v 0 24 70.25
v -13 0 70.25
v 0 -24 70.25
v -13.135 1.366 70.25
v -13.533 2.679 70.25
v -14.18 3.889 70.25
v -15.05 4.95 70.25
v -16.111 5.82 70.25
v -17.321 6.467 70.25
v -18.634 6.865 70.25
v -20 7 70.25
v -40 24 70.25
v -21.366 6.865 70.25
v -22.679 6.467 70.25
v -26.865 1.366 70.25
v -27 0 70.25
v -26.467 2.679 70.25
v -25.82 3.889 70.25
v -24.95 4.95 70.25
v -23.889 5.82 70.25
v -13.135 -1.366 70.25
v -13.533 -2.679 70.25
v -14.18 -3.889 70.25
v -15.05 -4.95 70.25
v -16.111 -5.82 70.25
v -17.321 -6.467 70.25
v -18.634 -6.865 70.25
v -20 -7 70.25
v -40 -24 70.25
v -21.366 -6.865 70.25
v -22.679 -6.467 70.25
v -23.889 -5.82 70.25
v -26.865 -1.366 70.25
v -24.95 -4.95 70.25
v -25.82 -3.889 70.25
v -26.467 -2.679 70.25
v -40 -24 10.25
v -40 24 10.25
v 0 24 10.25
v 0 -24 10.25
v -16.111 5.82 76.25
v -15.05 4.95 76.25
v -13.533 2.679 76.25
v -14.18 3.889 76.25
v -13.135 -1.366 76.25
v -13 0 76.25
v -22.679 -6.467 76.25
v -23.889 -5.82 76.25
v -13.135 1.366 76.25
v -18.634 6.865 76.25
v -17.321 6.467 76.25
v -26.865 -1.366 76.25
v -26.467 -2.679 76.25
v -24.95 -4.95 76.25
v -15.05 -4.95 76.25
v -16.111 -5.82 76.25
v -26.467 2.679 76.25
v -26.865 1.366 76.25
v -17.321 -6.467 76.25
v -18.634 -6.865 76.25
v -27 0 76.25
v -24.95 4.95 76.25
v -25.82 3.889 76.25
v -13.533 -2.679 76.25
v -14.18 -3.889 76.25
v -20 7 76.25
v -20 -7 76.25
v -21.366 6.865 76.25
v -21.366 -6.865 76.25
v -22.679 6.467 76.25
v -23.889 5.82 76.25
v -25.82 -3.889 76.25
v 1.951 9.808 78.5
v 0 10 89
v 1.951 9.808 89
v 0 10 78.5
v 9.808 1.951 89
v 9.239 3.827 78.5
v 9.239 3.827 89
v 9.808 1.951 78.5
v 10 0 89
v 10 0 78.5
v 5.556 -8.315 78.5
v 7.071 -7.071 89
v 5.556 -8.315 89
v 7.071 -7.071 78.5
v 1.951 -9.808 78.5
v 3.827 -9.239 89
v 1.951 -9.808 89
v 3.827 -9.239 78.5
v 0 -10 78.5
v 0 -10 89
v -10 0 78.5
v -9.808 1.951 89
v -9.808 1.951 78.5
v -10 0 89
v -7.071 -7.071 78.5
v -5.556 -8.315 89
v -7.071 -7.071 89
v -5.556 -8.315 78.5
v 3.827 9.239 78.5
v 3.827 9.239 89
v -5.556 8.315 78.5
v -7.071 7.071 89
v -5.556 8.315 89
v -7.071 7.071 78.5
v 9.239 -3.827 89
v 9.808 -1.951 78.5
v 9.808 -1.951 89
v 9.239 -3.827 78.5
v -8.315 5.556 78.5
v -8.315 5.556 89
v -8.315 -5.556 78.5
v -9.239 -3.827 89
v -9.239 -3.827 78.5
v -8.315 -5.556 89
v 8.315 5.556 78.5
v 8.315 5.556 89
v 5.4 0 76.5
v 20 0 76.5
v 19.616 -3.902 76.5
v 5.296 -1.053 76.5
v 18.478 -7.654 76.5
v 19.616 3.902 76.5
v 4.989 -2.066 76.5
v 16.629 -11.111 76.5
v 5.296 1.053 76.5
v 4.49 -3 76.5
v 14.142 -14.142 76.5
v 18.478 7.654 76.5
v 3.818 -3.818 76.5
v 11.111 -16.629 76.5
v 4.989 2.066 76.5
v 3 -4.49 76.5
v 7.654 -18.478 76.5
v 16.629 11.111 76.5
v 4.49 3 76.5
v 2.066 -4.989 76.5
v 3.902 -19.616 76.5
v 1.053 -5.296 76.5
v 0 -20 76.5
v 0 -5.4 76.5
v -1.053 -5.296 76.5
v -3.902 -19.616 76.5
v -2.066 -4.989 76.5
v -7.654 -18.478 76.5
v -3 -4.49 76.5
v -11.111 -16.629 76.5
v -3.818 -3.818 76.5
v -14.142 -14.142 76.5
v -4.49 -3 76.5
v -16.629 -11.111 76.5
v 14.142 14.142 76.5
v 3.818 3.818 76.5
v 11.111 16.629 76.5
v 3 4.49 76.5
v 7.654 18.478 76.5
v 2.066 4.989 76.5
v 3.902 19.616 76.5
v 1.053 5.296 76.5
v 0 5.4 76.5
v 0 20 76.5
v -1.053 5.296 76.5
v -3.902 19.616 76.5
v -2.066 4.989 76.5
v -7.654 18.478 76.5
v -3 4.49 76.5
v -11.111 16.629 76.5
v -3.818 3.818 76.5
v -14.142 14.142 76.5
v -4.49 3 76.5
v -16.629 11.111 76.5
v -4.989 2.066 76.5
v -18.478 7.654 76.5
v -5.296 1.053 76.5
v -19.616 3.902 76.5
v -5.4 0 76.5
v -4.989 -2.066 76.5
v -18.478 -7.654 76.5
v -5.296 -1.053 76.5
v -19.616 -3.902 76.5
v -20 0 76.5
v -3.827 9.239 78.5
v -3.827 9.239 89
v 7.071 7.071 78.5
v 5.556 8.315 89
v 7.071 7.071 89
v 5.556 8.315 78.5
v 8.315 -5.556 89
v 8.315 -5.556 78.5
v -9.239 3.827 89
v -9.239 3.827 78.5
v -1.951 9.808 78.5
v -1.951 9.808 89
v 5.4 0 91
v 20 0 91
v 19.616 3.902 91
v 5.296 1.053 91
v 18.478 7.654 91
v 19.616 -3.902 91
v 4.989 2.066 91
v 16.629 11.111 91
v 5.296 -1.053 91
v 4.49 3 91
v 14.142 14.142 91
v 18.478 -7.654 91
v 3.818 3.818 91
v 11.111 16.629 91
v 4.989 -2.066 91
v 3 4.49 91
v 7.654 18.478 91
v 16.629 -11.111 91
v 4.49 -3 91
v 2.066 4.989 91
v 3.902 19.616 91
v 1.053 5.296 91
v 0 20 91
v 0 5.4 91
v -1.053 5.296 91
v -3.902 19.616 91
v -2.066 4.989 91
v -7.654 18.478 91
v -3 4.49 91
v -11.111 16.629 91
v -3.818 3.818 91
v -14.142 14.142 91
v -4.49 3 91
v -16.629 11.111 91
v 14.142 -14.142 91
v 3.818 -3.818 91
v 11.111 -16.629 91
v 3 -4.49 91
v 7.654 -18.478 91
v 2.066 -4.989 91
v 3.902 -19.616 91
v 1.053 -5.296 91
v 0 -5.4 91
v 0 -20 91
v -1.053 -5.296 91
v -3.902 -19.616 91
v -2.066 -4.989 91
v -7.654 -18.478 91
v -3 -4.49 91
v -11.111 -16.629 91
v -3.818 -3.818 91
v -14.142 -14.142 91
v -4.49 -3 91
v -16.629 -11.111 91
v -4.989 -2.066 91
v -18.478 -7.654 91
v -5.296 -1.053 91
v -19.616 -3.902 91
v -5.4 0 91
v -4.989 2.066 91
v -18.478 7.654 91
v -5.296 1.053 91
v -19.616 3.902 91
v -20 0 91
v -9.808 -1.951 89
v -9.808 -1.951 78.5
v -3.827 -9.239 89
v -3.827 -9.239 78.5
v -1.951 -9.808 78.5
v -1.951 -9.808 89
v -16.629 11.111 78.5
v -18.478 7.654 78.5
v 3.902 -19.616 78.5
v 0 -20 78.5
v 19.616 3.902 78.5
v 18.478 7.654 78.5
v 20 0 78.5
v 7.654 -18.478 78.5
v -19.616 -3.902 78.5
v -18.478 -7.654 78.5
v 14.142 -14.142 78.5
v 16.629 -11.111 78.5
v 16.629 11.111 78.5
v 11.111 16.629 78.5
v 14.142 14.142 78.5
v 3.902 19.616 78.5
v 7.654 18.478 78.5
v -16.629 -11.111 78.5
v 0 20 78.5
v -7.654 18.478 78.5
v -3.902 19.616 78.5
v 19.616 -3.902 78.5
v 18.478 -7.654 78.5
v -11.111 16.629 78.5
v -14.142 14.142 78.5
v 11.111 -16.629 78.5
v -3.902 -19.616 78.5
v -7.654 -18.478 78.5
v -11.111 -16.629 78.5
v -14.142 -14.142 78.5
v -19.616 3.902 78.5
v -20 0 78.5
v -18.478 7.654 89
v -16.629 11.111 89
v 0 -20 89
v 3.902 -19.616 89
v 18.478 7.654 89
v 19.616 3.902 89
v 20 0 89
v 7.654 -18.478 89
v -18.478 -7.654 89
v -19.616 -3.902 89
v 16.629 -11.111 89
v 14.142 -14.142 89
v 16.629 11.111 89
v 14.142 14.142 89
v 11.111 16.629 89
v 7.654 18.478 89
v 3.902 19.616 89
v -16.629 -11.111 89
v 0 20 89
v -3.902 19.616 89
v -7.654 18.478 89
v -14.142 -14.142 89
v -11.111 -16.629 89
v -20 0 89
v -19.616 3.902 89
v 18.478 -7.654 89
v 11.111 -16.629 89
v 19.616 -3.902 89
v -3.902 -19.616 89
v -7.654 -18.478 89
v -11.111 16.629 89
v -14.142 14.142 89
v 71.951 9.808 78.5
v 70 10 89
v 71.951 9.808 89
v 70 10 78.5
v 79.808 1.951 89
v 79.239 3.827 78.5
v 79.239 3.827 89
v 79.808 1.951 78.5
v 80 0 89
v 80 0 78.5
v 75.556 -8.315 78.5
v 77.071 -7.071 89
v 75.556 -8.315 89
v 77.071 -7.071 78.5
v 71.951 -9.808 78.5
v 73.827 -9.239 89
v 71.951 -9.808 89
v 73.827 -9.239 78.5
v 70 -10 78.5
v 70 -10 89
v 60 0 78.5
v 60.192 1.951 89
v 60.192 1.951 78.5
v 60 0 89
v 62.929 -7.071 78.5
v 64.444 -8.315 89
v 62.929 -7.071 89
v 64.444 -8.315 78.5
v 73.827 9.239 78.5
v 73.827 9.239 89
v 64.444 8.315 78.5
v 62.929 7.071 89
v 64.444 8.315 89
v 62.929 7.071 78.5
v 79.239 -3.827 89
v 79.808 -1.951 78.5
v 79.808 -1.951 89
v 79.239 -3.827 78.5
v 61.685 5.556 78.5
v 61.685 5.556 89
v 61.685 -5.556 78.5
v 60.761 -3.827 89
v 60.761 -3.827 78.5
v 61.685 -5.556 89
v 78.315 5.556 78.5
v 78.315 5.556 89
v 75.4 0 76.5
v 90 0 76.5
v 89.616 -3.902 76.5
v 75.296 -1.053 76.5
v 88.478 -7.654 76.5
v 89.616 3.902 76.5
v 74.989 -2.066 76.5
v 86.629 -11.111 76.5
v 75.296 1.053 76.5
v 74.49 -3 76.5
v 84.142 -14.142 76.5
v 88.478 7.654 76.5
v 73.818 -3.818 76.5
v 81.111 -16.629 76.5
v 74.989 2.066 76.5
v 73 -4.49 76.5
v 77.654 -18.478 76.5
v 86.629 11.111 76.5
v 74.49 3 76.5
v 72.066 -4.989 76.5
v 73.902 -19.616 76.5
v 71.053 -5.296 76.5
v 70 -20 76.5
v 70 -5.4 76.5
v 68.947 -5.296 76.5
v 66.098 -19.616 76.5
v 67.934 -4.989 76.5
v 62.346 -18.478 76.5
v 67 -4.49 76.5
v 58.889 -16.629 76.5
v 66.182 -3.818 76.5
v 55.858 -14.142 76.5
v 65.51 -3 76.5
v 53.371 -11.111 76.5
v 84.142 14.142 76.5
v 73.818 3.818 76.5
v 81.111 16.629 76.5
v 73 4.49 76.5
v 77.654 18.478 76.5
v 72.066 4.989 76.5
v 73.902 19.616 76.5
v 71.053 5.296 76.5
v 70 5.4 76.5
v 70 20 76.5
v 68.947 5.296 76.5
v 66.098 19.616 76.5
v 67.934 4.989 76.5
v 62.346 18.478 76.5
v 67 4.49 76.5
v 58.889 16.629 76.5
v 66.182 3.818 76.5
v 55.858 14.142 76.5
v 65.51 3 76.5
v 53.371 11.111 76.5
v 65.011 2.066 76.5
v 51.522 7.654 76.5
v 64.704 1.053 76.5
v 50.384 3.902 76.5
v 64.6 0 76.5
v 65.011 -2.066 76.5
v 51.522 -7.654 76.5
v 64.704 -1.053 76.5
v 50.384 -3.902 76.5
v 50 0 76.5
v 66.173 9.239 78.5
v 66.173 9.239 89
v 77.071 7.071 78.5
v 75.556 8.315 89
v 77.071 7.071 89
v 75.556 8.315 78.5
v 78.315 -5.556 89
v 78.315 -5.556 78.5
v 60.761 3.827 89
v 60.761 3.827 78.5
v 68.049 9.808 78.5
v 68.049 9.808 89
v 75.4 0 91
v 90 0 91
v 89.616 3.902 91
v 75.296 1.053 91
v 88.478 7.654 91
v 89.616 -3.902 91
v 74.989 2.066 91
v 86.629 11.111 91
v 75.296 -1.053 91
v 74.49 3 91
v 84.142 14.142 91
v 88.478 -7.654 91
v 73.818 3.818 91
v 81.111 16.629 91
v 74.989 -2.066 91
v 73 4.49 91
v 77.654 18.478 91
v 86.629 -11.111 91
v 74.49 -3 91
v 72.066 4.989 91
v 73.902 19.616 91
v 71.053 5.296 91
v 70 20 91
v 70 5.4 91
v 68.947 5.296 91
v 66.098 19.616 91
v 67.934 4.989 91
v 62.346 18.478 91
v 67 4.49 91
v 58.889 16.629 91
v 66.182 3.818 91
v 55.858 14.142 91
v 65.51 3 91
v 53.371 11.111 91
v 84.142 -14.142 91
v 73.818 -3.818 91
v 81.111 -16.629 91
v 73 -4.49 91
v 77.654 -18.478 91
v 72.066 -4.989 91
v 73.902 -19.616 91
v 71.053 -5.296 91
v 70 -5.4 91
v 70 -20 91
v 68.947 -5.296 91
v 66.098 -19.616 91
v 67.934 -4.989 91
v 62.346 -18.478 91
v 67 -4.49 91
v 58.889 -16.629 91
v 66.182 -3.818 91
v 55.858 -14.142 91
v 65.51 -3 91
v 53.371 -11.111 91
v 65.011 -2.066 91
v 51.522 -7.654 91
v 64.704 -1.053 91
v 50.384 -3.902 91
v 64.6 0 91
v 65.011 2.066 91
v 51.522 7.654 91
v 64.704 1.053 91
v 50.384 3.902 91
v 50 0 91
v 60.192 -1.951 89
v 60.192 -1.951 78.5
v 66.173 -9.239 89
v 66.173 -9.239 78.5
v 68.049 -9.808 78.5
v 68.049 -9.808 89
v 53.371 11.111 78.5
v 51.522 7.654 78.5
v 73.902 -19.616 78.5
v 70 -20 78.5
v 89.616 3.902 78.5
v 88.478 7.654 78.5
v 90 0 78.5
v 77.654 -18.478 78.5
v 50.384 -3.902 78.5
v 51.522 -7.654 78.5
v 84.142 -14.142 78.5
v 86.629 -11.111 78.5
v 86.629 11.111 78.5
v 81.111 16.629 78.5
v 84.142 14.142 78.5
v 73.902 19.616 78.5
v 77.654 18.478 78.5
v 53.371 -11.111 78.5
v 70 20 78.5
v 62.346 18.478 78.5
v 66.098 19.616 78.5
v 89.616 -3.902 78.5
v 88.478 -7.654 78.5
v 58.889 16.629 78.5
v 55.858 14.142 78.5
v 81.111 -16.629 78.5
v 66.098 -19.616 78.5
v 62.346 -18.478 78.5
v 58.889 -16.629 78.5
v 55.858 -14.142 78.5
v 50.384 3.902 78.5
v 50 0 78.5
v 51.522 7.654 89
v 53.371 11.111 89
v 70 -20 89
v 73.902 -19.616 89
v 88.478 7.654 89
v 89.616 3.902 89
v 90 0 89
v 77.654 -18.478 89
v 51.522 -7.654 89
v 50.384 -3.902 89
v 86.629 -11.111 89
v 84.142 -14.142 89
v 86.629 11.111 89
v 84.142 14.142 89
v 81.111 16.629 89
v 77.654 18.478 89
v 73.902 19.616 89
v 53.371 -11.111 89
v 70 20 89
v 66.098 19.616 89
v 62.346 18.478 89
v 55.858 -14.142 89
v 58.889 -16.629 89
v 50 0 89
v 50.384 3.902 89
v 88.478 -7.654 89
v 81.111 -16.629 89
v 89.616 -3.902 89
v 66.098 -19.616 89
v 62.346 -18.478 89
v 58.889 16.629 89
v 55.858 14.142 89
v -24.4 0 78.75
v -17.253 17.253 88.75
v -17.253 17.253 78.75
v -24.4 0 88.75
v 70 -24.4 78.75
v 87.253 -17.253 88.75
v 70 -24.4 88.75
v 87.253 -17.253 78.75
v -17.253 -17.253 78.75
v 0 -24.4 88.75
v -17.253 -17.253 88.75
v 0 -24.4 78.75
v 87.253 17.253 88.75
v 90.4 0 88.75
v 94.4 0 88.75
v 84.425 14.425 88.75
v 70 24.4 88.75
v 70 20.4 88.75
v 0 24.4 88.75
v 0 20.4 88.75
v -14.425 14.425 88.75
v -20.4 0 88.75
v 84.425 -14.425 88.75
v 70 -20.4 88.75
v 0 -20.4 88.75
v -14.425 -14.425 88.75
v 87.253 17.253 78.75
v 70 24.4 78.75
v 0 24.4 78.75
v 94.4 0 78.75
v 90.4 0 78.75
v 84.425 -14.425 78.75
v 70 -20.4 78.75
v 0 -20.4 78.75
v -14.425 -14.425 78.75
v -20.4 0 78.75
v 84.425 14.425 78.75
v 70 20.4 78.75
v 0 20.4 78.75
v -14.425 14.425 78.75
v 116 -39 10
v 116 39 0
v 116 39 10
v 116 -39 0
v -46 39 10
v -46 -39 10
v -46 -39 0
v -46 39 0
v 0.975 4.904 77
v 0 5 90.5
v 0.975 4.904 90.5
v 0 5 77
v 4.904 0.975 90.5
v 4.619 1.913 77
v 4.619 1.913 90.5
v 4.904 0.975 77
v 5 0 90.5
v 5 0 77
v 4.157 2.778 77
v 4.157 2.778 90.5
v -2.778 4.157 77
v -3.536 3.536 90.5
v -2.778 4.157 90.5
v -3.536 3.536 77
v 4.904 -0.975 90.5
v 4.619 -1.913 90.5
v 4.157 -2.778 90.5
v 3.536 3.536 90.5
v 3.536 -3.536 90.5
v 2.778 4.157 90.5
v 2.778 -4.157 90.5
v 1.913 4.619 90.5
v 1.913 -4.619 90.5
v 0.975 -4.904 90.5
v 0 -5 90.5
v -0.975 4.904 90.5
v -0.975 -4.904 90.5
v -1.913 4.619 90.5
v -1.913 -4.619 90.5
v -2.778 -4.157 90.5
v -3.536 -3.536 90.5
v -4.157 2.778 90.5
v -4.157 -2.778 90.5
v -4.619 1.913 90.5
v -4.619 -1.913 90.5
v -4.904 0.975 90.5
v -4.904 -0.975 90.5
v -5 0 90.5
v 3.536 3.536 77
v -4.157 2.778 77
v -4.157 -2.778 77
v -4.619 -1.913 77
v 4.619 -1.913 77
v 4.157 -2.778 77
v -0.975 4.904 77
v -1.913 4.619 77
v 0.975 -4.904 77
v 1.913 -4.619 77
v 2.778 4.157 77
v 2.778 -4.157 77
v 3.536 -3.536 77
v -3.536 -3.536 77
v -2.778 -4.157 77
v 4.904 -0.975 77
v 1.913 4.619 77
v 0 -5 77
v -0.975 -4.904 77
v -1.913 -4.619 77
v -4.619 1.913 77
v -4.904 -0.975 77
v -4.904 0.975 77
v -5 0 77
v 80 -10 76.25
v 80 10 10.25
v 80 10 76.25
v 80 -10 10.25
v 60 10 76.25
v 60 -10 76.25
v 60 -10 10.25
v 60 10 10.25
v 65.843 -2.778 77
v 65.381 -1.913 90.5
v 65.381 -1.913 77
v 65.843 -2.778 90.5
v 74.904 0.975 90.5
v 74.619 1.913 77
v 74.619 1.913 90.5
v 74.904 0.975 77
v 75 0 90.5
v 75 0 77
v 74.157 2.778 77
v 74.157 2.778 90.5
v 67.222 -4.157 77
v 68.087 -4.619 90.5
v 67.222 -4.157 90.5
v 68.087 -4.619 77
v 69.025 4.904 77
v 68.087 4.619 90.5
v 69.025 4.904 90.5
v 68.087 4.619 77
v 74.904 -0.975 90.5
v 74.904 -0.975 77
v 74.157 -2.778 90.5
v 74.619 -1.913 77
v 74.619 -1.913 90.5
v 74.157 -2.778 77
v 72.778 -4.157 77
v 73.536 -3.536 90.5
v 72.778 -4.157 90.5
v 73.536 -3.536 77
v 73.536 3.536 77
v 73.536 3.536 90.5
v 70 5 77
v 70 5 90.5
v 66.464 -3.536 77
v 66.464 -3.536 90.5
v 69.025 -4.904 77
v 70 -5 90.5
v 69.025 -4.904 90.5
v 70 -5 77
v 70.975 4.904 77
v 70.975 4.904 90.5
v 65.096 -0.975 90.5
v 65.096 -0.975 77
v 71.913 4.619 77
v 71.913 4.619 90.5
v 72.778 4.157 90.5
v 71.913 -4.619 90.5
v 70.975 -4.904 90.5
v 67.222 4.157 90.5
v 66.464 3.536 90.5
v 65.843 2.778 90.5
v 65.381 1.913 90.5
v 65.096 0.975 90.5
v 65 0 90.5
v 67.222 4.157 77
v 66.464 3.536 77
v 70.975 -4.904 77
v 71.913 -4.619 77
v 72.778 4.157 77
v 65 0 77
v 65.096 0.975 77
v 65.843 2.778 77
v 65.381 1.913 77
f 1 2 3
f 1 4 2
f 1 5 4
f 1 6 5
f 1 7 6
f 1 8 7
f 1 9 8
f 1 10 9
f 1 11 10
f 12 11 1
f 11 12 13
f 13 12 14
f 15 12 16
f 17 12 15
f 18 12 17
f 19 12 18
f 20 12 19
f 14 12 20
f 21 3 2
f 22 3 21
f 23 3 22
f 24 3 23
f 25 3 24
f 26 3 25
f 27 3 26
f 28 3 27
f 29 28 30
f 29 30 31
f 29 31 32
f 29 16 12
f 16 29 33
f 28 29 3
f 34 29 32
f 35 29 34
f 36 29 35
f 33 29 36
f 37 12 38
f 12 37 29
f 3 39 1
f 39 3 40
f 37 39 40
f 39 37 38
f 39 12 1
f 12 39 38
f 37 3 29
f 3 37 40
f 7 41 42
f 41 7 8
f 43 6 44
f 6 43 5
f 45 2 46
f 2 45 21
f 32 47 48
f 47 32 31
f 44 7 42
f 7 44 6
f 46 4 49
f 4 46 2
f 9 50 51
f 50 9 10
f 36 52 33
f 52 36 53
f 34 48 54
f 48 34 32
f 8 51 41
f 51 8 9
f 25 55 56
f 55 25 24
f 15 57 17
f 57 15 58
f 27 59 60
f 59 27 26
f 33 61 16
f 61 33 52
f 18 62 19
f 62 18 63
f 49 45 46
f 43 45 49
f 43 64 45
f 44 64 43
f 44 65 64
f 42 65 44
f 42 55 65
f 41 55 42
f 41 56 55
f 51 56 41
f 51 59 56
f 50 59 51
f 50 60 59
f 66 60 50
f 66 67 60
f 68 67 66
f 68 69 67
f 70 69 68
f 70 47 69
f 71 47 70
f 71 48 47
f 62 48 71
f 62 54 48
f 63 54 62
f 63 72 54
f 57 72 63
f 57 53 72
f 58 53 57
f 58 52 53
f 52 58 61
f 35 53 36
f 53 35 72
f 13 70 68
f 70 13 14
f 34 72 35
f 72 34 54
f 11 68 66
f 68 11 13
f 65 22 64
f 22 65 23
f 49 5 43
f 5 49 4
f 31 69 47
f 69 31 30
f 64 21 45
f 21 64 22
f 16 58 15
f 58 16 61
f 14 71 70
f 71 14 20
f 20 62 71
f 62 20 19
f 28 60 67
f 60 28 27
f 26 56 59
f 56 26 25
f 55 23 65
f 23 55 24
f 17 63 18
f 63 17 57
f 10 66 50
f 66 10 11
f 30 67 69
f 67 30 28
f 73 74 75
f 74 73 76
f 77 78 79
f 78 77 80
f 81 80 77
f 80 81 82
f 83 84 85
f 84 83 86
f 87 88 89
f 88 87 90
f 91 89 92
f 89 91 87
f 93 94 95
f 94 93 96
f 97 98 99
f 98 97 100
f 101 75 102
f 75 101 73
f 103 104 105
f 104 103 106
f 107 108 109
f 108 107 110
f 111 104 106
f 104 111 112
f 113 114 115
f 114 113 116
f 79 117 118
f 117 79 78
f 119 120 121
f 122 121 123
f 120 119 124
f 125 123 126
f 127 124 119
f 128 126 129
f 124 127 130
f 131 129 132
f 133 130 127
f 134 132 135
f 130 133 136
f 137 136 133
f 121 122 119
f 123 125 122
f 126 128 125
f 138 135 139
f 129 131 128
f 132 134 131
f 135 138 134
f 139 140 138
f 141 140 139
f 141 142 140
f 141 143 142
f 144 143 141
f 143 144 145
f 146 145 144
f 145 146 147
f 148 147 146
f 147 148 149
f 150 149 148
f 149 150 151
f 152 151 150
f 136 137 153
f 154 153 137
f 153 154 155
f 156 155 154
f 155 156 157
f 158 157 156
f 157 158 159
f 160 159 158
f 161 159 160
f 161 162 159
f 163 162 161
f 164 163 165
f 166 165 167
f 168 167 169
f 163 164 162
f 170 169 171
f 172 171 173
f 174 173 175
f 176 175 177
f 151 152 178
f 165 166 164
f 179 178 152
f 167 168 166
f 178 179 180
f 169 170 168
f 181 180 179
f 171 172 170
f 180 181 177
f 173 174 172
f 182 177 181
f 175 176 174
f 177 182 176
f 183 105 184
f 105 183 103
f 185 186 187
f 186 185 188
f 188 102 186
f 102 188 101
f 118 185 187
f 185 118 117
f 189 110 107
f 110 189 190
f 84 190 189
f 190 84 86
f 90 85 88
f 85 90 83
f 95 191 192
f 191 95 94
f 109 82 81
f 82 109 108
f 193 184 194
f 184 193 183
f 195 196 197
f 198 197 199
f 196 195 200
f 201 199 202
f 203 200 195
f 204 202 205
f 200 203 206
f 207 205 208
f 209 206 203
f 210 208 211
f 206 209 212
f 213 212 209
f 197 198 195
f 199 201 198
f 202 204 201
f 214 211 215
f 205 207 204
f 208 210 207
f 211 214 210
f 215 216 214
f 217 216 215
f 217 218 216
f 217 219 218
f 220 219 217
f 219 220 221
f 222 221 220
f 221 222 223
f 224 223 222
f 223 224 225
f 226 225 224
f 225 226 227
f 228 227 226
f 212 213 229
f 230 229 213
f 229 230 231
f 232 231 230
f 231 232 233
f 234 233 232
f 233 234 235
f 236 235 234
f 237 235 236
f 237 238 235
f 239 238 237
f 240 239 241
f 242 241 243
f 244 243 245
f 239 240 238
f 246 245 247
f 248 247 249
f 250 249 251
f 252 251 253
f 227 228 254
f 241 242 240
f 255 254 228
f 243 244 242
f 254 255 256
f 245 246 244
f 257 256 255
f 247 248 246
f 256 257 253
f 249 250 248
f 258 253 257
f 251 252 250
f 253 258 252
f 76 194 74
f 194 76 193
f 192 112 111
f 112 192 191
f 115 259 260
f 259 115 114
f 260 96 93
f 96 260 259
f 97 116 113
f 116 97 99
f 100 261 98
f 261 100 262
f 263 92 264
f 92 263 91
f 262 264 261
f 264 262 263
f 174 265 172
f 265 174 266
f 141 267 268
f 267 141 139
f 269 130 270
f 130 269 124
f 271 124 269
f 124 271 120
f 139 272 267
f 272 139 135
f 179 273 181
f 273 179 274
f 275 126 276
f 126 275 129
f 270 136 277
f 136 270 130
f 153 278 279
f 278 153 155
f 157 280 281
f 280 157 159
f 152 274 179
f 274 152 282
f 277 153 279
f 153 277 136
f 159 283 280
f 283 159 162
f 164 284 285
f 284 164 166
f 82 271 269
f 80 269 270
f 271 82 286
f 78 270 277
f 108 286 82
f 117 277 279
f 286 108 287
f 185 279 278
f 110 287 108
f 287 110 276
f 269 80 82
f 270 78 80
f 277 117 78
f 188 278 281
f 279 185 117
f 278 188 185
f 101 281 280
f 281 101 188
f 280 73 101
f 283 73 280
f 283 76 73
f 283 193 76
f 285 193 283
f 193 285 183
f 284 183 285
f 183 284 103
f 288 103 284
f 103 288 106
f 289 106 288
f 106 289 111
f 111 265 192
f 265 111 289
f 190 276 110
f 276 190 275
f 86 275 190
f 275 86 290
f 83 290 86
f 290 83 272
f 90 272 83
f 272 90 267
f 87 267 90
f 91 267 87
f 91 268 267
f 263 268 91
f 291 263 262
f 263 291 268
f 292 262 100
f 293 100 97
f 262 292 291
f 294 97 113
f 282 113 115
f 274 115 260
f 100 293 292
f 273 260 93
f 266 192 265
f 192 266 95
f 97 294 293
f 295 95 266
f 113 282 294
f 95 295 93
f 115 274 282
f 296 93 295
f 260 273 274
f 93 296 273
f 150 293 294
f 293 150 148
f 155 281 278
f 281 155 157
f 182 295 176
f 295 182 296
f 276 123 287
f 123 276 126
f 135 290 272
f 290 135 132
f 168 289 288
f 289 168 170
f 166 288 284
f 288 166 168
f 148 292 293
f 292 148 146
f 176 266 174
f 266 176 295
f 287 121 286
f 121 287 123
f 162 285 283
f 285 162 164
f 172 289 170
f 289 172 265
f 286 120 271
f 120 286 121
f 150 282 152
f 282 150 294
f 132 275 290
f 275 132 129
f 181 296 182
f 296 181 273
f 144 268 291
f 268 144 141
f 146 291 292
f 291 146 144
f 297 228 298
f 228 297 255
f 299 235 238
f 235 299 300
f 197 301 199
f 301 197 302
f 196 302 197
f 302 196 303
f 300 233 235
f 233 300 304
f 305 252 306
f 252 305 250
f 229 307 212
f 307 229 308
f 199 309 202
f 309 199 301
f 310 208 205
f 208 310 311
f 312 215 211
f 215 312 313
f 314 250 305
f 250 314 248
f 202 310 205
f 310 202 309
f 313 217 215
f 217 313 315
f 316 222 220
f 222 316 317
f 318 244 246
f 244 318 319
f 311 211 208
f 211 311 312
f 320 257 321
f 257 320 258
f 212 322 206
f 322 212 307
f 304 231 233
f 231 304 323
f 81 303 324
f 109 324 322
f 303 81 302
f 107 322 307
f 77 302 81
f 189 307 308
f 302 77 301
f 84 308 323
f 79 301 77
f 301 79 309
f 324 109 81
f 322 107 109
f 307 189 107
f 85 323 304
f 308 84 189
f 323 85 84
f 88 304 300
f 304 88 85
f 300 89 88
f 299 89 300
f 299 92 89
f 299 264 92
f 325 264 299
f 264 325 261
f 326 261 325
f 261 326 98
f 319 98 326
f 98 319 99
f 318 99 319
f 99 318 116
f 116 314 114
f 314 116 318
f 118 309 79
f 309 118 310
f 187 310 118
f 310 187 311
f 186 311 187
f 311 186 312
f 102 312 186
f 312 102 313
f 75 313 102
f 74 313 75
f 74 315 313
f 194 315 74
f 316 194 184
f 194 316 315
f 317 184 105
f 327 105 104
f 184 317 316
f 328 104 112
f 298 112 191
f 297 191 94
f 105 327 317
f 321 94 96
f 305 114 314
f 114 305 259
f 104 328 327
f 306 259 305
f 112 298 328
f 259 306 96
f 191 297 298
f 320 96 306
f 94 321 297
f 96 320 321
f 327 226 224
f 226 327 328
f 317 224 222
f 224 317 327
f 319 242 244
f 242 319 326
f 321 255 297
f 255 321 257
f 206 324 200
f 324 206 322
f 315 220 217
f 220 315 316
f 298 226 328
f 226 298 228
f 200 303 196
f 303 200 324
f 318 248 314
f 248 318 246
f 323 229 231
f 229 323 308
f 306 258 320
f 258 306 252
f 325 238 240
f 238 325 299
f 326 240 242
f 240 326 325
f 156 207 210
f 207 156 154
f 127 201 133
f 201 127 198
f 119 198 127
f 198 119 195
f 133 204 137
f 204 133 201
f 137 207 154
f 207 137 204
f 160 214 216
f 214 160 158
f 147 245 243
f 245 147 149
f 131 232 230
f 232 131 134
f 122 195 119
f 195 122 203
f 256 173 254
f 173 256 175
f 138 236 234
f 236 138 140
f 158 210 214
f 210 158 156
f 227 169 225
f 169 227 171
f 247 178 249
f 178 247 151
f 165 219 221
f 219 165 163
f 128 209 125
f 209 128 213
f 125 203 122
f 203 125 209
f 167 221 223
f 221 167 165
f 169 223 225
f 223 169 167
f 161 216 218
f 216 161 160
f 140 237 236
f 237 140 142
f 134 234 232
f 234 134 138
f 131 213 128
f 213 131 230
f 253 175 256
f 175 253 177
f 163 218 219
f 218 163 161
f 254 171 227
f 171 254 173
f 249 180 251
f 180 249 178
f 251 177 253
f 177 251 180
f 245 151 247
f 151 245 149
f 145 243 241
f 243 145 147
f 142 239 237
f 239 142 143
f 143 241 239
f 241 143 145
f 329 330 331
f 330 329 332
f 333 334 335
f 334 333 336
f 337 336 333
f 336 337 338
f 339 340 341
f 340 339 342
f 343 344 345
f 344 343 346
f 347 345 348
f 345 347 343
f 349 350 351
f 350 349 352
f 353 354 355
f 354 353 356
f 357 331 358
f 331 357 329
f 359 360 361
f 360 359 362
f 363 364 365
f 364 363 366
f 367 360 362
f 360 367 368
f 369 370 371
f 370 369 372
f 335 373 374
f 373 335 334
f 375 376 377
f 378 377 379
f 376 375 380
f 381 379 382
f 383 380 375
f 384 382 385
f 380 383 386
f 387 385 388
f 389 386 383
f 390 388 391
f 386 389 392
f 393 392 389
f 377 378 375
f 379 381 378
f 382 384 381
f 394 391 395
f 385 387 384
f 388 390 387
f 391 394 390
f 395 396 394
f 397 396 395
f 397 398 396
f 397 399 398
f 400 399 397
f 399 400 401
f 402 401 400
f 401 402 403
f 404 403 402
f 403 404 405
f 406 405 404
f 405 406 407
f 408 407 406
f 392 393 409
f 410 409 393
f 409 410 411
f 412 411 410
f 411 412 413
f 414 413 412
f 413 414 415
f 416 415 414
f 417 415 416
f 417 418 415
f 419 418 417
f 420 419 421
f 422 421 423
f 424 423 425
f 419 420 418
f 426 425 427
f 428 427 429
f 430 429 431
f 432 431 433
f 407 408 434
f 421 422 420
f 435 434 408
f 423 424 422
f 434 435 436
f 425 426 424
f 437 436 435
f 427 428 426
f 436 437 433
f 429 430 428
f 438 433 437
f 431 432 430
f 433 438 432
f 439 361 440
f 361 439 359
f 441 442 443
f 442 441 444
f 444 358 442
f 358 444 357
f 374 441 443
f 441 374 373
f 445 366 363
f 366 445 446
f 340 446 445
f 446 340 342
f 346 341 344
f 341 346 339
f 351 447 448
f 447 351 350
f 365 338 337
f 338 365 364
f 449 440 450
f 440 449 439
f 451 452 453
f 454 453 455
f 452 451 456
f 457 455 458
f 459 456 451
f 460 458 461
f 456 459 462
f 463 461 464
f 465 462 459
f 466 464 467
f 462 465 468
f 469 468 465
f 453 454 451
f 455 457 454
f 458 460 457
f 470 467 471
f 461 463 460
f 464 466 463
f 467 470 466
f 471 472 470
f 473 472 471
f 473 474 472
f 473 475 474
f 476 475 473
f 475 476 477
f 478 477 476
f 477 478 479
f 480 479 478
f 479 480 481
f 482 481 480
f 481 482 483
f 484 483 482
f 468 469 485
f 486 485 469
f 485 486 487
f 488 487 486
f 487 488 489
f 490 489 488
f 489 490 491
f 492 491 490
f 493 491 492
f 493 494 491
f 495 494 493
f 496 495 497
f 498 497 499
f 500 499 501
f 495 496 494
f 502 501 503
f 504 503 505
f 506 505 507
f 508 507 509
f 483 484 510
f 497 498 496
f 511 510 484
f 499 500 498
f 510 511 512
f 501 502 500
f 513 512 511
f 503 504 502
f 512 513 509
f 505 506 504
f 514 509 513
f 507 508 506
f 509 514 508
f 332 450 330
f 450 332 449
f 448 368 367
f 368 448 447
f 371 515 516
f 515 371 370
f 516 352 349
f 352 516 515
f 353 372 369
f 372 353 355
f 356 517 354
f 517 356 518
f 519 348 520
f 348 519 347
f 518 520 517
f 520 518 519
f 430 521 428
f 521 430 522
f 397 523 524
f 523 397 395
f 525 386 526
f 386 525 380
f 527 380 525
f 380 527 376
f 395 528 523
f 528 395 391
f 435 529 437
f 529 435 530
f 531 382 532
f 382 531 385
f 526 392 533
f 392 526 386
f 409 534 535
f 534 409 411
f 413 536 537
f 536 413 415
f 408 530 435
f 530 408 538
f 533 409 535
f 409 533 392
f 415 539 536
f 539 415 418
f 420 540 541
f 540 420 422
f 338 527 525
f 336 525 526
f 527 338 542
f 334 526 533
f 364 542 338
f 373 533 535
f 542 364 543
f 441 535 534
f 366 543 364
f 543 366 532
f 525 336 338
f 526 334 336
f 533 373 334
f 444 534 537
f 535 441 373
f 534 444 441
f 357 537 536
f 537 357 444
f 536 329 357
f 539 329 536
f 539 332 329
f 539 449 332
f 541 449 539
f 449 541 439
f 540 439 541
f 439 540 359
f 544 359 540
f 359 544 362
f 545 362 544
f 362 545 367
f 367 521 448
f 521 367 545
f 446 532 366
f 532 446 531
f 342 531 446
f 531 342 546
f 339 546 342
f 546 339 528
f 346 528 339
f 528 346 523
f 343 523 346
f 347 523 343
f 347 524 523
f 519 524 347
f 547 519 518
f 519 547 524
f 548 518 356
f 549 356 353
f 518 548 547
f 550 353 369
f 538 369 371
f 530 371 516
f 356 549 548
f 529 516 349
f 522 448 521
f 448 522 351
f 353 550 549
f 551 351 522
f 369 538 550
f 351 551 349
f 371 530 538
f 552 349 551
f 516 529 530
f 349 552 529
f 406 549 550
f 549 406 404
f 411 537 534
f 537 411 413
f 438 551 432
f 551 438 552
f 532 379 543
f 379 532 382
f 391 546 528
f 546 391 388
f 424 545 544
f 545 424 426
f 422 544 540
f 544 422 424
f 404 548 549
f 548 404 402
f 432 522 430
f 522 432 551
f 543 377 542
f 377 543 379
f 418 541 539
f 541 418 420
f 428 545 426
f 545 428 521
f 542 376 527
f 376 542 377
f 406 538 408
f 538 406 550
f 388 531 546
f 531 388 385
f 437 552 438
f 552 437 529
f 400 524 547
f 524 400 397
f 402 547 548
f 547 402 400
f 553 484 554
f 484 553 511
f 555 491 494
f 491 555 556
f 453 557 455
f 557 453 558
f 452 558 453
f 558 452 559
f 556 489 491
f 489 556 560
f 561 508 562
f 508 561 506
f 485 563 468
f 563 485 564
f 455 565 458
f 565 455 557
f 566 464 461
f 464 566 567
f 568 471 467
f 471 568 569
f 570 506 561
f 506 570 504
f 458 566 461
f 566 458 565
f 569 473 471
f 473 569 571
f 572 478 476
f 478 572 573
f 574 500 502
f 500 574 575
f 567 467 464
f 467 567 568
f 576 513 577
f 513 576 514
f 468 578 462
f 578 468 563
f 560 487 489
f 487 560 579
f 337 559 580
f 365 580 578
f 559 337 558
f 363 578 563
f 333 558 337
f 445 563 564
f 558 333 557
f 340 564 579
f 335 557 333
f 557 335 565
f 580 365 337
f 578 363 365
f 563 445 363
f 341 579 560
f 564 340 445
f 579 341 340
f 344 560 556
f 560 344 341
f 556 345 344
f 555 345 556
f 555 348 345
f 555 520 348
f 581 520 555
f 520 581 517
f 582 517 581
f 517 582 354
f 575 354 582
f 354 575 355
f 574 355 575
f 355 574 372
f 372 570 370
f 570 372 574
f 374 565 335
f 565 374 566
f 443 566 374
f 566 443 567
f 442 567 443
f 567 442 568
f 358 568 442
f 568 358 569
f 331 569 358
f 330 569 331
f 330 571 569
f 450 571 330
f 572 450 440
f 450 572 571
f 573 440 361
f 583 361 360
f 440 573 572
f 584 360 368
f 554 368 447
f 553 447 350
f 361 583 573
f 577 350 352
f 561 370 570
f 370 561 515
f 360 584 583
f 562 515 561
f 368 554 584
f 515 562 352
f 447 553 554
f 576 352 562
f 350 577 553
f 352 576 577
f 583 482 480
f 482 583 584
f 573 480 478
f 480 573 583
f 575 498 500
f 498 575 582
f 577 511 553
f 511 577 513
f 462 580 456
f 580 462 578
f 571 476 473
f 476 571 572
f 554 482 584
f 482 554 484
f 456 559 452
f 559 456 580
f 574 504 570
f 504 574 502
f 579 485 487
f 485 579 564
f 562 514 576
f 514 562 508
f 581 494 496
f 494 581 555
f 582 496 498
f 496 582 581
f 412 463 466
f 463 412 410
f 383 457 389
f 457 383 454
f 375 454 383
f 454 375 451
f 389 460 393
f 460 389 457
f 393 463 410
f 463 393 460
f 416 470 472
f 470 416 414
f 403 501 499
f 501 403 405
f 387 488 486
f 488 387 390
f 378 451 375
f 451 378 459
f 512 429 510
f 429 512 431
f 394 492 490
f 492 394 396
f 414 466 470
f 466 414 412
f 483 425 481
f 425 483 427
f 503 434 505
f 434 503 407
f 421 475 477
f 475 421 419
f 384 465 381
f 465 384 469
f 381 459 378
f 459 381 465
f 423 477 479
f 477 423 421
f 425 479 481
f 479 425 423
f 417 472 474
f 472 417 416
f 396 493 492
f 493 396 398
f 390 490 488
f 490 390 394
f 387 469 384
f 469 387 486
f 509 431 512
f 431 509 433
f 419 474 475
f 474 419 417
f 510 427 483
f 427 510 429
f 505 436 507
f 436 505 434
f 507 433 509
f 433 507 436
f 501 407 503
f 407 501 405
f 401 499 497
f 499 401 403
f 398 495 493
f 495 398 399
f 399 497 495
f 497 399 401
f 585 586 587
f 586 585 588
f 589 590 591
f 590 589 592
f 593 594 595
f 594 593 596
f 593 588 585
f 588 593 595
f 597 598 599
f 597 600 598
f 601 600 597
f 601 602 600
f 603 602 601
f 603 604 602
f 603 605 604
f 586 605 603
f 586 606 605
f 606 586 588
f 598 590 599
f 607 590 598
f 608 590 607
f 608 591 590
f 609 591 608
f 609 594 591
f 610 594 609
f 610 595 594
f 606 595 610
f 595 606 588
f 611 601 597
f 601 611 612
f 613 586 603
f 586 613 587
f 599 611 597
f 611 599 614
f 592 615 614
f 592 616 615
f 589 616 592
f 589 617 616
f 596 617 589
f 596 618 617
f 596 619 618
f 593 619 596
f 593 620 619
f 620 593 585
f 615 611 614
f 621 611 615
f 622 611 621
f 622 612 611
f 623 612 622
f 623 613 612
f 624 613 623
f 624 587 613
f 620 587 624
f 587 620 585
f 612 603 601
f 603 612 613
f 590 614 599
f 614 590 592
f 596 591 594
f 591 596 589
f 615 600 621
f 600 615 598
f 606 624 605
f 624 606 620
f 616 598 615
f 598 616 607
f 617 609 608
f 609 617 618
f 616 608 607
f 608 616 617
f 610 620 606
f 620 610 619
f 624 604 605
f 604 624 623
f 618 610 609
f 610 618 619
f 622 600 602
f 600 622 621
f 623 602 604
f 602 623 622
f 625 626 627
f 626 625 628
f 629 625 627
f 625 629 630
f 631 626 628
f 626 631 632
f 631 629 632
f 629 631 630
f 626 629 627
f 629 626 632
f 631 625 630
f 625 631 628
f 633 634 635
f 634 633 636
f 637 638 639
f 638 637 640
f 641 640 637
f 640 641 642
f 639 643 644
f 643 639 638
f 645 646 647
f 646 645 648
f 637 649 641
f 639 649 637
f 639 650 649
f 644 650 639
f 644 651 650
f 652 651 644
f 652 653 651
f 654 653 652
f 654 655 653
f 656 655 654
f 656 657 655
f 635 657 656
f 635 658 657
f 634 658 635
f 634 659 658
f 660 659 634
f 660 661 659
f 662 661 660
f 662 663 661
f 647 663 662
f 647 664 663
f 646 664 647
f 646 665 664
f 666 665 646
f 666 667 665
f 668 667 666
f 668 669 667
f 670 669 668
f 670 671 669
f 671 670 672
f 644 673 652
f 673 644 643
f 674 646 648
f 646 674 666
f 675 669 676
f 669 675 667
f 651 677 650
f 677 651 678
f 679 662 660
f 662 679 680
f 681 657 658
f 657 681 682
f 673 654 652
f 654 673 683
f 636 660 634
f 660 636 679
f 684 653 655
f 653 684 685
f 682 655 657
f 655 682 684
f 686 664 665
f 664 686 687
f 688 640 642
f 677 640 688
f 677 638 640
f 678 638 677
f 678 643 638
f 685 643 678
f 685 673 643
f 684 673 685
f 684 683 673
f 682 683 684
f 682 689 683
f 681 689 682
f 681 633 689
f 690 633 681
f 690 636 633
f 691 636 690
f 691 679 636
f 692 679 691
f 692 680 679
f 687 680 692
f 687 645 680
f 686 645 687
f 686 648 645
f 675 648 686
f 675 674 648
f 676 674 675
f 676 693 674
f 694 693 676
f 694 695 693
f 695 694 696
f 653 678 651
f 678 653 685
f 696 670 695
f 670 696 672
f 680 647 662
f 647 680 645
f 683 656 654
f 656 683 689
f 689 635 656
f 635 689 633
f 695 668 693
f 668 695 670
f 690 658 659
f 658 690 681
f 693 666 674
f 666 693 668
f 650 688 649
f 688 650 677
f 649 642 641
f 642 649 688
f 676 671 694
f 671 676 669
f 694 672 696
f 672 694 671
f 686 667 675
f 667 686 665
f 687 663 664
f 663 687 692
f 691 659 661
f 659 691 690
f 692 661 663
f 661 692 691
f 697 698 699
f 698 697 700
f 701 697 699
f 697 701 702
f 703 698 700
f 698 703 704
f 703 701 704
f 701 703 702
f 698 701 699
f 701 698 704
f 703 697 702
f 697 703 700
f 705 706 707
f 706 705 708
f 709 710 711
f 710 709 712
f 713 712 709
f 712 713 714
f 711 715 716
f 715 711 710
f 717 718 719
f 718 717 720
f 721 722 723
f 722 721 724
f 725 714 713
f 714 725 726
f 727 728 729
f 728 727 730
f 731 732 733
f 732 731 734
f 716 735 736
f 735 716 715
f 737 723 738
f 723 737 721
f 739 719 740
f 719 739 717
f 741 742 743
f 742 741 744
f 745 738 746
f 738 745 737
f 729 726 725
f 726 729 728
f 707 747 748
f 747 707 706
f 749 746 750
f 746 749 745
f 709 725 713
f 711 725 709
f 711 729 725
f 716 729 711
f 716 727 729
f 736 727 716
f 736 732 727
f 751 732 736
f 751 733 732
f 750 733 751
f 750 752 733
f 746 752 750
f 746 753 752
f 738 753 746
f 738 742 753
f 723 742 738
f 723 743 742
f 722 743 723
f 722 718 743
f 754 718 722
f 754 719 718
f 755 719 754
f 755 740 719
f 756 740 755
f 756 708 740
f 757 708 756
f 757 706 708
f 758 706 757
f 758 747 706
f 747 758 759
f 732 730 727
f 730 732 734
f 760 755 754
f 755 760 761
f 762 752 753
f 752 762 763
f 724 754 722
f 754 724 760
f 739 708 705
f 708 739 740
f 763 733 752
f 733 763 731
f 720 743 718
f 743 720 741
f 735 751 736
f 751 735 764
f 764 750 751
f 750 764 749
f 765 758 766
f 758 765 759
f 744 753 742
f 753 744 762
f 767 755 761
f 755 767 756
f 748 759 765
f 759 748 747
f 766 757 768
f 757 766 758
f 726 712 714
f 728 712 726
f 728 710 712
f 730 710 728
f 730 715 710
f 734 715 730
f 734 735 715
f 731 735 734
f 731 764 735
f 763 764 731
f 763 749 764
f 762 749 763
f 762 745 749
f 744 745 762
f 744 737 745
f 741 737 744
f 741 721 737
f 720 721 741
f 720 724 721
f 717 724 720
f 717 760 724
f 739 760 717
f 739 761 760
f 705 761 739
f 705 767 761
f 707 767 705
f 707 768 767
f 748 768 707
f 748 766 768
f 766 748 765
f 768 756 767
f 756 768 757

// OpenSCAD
$fn = 32;

// ------------------------------------------------------------------------
// Motor belt drive: span 70 mm, pulleys d40, belt 10 mm wide
// Every part is its own module, assembly() places every instance.
// ------------------------------------------------------------------------

// --- part 1 ---
module base_plate() {
  difference() {
    translate([-81, -39, 0]) cube([162, 78, 10]);
  }
}

// --- part 2 ---
module motor() {
  union() {
    translate([-30, -24, 0]) cube([60, 48, 40]);
    translate([33, 0, 20]) rotate([0, 90, 0]) cylinder(h = 6, d = 14, center = true);
  }
}

// --- part 3 ---
module drive_shaft() {
  translate([0, 0, -6.75]) cylinder(h = 13.5, d = 10);
}

// --- part 4 ---
module pulley_drive() {
  difference() {
    union() {
      cylinder(h = 14.5, d = 20);
      cylinder(h = 2, d = 40);
      translate([0, 0, 12.5]) cylinder(h = 2, d = 40);
    }
    translate([0, 0, -1]) cylinder(h = 16.5, d = 10.8);
  }
}

// --- part 5 ---
module idler_post() {
  translate([-10, -10, 0]) cube([20, 20, 66]);
}

// --- part 6 ---
module driven_shaft() {
  translate([0, 0, -6.75]) cylinder(h = 13.5, d = 10);
}

// --- part 7 ---
module pulley_driven() {
  difference() {
    union() {
      cylinder(h = 14.5, d = 20);
      cylinder(h = 2, d = 40);
      translate([0, 0, 12.5]) cylinder(h = 2, d = 40);
    }
    translate([0, 0, -1]) cylinder(h = 16.5, d = 10.8);
  }
}

// --- part 8 ---
module drive_belt() {
  difference() {
    linear_extrude(height = 10) polygon(points = concat([for (a = [90 : 45 : 270]) [24.4 * cos(a), 24.4 * sin(a)]], [for (a = [270 : 45 : 450]) [70 + 24.4 * cos(a), 24.4 * sin(a)]]));
    translate([0, 0, -1]) linear_extrude(height = 12) polygon(points = concat([for (a = [90 : 45 : 270]) [20.4 * cos(a), 20.4 * sin(a)]], [for (a = [270 : 45 : 450]) [70 + 20.4 * cos(a), 20.4 * sin(a)]]));
  }
}

// --- assembly ---
module assembly() {
  color([0.80, 0.24, 0.20]) translate([35, 0, 0]) rotate([0, 0, 0]) base_plate();
  color([0.20, 0.45, 0.75]) translate([0, 0, 40.25]) rotate([0, 270, 0]) motor();
  color([0.25, 0.62, 0.32]) translate([0, 0, 83.75]) rotate([0, 0, 0]) drive_shaft();
  color([0.92, 0.70, 0.18]) translate([0, 0, 76.5]) rotate([0, 0, 0]) pulley_drive();
  color([0.58, 0.35, 0.70]) translate([70, 0, 10.25]) rotate([0, 0, 0]) idler_post();
  color([0.16, 0.66, 0.66]) translate([70, 0, 83.75]) rotate([0, 0, 0]) driven_shaft();
  color([0.85, 0.48, 0.18]) translate([70, 0, 76.5]) rotate([0, 0, 0]) pulley_driven();
  color([0.55, 0.60, 0.65]) translate([0, 0, 78.75]) rotate([0, 0, 0]) drive_belt();
}

assembly();
